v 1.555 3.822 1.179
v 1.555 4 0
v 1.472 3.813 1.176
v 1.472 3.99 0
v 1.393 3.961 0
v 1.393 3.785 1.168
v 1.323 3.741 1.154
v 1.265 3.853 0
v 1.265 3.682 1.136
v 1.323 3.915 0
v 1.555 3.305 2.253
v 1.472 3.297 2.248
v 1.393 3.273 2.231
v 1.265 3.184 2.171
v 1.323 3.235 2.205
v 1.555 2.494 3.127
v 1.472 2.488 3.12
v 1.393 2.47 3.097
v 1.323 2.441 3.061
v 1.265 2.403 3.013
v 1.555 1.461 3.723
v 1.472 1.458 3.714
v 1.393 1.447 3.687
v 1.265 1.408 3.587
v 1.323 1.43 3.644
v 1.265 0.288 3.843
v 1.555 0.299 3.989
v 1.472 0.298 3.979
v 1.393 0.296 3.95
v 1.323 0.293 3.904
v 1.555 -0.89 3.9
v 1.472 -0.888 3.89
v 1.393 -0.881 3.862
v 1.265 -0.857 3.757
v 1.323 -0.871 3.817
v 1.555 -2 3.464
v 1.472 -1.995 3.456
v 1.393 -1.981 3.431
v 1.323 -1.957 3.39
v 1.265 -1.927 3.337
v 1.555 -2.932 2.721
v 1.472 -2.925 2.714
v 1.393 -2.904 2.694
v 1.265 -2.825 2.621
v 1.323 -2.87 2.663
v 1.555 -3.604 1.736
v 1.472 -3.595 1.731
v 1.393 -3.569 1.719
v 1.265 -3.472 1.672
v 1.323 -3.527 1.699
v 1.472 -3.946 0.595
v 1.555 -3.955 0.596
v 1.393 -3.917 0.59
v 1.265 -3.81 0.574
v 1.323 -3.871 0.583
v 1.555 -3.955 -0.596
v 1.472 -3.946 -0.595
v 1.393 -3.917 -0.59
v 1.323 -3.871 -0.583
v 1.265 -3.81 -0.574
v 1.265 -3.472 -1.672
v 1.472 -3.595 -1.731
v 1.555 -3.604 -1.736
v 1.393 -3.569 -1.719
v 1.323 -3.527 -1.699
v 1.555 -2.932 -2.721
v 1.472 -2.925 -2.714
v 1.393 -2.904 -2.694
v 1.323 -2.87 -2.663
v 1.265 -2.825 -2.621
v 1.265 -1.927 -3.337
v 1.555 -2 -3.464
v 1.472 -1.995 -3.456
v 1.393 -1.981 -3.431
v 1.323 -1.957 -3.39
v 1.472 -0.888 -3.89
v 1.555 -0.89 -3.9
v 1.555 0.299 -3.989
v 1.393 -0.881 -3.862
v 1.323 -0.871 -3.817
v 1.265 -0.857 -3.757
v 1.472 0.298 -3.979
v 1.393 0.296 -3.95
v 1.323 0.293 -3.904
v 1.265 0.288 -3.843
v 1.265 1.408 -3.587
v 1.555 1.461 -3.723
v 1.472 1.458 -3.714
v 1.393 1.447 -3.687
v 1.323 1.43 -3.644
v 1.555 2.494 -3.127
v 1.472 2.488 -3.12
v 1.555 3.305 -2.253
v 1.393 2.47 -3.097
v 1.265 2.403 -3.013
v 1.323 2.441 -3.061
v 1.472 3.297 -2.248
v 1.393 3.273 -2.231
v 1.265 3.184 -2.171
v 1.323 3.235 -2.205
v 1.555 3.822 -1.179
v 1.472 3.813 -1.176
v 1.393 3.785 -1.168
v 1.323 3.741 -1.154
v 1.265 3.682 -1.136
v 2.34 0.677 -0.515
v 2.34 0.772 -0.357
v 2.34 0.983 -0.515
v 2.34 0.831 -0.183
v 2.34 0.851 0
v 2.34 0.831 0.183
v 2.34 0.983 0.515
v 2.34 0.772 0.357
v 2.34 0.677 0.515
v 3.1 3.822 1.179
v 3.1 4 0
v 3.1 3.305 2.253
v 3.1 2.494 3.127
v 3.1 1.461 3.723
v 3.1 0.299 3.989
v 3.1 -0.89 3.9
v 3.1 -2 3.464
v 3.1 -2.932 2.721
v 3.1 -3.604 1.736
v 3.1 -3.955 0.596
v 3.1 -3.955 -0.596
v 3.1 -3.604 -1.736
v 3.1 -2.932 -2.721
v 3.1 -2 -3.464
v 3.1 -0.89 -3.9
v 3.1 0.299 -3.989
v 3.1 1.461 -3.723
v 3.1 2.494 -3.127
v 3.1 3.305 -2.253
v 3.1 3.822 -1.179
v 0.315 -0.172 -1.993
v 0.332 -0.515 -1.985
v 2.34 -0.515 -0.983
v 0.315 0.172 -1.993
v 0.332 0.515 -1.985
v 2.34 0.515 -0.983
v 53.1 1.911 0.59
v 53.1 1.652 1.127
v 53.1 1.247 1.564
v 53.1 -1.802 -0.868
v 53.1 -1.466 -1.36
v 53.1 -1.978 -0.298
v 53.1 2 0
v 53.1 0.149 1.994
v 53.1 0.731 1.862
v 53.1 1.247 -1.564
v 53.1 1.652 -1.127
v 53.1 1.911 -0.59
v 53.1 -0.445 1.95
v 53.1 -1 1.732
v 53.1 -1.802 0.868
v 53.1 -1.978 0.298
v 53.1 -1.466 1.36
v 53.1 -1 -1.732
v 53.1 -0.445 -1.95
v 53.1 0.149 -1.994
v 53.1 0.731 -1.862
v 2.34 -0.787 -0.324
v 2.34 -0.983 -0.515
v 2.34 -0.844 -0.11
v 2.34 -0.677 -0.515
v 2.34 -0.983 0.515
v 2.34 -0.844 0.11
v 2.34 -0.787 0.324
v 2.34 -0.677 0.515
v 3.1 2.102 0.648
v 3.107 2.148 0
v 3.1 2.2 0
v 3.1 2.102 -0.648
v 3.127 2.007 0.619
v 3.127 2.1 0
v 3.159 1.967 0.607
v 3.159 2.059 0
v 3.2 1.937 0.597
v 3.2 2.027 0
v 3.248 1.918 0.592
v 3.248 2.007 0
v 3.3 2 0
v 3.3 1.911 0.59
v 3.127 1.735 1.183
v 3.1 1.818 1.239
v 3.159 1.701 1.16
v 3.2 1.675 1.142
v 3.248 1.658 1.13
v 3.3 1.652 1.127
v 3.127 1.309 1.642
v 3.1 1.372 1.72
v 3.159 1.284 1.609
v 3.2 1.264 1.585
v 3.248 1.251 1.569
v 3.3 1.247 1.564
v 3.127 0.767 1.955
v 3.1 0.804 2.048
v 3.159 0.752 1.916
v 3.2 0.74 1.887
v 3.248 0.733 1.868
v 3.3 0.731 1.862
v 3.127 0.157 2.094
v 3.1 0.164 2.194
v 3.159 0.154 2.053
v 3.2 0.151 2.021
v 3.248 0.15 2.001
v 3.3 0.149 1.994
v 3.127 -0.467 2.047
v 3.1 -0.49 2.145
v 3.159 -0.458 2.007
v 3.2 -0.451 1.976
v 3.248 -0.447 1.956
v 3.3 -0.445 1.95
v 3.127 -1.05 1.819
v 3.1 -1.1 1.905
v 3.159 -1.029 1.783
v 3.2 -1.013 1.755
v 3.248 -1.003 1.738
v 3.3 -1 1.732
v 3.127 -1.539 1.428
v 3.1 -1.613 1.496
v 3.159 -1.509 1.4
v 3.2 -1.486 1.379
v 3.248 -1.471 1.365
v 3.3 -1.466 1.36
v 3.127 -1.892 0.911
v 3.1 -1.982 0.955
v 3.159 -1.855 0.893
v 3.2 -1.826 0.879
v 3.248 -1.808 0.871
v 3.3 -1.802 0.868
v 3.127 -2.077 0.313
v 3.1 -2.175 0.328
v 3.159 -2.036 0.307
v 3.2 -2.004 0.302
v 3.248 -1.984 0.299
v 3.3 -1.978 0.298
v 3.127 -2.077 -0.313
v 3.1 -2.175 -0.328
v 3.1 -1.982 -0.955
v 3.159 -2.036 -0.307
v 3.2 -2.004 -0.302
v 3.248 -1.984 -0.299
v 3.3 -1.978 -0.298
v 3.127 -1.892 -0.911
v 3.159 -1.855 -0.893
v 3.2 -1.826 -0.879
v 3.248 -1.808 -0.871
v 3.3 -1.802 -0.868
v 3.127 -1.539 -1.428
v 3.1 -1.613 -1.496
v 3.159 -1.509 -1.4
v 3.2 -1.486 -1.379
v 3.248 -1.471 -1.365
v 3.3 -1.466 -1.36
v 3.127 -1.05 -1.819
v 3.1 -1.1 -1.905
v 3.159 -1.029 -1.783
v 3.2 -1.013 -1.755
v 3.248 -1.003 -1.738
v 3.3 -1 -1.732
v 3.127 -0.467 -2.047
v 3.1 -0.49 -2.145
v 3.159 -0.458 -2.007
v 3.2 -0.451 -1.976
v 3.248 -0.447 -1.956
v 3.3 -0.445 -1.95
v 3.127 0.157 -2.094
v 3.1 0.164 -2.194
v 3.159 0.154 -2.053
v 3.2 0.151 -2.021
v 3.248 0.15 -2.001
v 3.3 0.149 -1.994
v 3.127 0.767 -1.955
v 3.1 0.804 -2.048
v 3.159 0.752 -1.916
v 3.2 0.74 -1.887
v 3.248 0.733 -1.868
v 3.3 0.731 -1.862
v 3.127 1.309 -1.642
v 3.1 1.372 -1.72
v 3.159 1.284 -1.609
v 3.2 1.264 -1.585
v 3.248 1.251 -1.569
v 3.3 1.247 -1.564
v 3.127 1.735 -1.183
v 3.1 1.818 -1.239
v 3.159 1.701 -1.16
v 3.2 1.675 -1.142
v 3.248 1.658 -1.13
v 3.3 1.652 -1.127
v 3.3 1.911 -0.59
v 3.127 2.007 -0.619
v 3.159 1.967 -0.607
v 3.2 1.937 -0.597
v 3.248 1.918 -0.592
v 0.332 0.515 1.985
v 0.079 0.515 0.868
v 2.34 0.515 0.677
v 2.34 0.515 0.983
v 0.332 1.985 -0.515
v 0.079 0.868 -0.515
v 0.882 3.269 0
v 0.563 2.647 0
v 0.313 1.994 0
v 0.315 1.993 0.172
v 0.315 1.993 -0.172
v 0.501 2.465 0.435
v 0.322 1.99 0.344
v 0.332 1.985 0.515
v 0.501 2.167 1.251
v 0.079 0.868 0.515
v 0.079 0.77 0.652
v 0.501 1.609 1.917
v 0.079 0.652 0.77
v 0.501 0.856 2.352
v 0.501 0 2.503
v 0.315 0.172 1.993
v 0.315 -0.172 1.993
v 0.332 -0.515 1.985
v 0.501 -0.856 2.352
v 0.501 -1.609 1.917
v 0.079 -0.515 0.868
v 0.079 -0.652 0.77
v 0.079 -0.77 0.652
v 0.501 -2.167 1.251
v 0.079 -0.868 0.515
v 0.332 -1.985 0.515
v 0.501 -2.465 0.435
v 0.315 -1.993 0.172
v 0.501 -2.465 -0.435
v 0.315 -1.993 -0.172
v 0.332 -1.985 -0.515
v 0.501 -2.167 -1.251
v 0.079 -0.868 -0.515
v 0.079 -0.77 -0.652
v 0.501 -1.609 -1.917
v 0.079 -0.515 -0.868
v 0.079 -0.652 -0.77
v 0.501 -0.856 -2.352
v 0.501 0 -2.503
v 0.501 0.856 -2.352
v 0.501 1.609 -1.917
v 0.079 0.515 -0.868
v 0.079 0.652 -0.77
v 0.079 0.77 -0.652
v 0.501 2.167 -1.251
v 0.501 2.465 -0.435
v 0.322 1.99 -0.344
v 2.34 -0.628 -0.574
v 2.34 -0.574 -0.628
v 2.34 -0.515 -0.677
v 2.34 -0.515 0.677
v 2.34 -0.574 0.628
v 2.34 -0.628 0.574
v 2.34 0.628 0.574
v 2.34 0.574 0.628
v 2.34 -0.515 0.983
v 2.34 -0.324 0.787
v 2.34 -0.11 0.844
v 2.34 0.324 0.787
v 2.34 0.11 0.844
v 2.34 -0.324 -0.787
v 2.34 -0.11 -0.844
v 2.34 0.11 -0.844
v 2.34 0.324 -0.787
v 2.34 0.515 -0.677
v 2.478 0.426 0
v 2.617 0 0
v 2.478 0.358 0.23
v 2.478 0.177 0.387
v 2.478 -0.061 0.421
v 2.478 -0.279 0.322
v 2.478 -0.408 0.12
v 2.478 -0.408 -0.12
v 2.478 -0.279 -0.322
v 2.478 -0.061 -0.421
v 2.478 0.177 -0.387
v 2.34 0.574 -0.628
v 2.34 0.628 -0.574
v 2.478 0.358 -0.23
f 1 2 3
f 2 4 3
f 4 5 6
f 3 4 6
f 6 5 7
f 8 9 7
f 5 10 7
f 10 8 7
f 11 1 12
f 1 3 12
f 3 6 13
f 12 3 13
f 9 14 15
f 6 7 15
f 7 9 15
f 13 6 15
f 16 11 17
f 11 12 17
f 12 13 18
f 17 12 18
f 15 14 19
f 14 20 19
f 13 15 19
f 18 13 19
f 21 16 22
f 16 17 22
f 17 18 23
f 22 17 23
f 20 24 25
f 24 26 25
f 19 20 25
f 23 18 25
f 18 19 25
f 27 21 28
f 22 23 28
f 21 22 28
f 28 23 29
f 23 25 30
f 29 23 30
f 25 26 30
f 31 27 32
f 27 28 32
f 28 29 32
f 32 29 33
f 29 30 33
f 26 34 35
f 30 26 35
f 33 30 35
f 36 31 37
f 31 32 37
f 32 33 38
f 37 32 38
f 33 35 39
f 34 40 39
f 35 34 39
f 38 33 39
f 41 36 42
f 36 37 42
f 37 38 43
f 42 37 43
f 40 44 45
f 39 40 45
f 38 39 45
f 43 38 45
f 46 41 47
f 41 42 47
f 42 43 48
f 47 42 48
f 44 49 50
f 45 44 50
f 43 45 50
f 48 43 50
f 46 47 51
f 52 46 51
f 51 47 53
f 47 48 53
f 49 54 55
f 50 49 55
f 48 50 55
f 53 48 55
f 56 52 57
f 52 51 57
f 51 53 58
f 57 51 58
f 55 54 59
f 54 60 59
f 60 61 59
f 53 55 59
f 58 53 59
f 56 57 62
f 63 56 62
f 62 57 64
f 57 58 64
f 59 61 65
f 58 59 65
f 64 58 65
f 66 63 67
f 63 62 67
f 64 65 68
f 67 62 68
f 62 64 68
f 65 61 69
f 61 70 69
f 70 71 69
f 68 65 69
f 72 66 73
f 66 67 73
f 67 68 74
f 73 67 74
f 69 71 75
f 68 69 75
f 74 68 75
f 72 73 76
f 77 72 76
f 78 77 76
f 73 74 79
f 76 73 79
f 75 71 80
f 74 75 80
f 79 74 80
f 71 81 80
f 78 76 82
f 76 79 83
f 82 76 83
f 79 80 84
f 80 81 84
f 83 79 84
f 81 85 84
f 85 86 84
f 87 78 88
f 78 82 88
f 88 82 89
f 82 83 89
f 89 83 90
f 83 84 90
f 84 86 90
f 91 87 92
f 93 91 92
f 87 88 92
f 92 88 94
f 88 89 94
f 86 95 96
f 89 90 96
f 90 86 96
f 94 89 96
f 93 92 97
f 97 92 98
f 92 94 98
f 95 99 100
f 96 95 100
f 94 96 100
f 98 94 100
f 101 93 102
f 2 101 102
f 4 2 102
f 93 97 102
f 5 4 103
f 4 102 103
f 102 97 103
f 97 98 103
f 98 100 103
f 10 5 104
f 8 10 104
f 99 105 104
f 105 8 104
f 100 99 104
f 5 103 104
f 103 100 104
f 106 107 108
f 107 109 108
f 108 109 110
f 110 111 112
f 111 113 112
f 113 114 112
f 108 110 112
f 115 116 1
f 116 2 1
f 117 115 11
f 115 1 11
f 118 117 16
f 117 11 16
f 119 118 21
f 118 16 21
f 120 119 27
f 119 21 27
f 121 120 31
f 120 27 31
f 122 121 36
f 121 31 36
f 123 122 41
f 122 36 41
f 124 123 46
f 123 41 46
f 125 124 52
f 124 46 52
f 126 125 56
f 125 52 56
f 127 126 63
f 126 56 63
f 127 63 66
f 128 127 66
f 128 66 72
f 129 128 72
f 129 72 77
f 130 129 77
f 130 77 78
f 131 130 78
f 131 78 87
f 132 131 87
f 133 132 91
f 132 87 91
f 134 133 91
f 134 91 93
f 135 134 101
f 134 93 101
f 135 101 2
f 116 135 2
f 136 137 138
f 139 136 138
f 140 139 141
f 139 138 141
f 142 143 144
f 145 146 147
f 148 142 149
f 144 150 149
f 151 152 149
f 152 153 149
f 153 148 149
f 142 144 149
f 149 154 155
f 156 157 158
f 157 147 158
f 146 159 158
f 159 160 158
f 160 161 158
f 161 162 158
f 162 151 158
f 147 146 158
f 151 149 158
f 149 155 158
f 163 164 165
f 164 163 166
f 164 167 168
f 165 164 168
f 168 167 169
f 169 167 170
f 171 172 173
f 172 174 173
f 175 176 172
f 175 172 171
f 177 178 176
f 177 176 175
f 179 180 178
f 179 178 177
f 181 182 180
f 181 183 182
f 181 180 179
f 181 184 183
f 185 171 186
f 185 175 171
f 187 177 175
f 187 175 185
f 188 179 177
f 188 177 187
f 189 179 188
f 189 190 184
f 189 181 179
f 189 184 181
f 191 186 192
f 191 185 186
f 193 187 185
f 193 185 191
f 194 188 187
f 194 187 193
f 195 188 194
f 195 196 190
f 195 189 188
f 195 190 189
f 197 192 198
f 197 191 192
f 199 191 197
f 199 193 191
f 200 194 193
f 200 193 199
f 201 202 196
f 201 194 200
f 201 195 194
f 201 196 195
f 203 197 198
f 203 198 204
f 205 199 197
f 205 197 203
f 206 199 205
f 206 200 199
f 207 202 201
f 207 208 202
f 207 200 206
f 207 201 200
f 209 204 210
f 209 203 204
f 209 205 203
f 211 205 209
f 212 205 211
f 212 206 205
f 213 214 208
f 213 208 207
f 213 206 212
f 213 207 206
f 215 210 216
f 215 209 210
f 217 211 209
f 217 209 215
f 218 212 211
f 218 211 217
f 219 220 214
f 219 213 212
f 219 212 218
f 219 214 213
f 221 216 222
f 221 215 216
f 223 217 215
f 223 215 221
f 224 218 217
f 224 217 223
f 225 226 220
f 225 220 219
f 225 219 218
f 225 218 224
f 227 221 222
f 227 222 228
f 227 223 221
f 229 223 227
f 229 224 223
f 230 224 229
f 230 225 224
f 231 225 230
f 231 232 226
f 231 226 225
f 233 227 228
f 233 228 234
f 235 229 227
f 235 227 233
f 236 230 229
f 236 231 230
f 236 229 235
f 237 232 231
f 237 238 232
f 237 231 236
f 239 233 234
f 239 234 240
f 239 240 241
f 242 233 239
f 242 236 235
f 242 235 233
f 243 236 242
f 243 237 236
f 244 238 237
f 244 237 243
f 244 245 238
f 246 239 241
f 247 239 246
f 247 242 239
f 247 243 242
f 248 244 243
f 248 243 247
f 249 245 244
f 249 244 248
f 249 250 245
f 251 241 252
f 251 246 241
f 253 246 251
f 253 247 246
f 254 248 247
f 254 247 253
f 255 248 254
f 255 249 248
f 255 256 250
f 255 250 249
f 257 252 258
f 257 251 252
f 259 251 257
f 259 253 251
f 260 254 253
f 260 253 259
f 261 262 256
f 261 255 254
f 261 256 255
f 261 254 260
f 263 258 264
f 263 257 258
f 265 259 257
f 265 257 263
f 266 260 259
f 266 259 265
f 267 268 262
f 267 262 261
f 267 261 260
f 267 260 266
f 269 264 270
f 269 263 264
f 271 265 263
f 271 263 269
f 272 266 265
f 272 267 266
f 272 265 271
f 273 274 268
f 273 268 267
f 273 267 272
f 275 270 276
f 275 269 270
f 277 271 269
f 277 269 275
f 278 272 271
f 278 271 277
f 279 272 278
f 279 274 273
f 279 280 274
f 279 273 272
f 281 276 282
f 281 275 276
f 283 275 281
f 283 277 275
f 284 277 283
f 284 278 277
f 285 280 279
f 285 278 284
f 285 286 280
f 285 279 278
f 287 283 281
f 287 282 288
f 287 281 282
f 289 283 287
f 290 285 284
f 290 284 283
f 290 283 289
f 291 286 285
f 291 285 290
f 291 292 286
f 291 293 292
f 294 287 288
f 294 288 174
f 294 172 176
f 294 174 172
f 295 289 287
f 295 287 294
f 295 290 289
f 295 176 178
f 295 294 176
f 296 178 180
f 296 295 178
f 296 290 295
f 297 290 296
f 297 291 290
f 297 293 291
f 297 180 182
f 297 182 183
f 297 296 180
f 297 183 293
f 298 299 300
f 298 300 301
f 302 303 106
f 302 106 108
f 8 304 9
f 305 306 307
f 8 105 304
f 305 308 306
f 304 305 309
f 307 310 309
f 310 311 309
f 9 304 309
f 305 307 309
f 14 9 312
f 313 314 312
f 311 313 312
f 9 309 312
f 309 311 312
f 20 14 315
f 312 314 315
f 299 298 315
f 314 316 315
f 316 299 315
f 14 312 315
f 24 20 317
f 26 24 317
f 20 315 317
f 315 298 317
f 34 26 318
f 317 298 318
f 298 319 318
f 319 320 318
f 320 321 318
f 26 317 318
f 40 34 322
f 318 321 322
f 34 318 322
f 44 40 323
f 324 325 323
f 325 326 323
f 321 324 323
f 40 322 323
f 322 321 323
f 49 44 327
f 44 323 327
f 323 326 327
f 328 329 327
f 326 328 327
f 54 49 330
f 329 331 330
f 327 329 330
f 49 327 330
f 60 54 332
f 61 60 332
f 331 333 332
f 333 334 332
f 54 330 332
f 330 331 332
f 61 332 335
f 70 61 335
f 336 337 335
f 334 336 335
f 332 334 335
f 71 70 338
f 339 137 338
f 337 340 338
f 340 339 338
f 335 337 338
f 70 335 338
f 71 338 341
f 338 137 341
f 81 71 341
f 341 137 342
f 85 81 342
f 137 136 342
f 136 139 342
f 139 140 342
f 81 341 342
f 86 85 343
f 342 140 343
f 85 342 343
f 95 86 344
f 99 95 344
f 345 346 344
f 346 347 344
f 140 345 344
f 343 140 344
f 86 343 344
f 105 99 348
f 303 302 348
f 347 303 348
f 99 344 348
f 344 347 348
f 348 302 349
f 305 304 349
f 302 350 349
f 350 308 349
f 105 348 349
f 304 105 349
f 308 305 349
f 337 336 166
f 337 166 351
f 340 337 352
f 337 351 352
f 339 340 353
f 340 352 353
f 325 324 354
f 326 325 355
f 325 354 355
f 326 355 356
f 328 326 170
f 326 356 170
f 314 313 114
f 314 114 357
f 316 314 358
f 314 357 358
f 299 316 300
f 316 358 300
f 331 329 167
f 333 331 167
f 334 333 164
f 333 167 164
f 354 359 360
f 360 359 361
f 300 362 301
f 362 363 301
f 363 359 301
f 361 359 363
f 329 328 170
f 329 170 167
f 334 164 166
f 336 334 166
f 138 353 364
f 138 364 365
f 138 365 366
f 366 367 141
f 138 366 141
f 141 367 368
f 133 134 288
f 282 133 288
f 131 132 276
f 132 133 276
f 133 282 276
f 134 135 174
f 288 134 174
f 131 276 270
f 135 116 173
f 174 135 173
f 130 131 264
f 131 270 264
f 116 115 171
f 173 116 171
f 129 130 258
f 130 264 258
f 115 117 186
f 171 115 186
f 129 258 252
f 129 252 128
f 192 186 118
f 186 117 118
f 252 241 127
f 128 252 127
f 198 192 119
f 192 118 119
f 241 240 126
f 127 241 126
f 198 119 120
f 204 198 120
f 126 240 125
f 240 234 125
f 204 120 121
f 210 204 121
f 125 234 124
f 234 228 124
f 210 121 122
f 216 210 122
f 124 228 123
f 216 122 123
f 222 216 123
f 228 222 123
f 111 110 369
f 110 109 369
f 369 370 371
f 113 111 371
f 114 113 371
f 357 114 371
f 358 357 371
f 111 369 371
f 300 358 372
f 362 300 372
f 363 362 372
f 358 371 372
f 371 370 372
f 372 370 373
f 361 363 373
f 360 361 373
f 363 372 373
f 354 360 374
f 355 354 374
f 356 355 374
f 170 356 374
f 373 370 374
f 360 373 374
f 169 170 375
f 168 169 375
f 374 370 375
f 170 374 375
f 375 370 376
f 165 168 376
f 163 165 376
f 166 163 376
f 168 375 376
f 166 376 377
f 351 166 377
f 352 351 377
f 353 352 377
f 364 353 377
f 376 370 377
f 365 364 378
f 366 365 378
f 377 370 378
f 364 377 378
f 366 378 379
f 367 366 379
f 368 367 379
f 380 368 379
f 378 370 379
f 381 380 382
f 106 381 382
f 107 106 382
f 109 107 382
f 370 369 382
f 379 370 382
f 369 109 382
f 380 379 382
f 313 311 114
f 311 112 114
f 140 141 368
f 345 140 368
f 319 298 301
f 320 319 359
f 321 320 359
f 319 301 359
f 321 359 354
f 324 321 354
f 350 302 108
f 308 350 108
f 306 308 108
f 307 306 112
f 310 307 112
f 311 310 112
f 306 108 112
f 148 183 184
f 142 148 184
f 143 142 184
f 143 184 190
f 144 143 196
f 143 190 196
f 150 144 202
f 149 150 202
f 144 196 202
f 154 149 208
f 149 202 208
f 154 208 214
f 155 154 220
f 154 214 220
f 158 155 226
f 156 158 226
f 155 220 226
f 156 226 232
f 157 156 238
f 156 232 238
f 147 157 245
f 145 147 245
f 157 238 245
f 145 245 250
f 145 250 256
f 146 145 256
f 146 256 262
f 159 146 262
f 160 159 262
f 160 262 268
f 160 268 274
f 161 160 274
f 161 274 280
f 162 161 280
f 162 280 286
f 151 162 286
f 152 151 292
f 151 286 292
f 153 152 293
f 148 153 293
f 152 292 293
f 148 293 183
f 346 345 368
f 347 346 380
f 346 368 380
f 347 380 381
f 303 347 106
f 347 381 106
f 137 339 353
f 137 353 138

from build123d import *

# Parameters (mm, degrees)
FILLET1_R    = 0.2
SKETCH3_W    = 1.03
SKETCH3_H    = 4.3
SKETCH4_W    = 1.03
SKETCH4_H    = 1.966638154
RECPAT_COUNT = 2
RECPAT_ANGLE = 90


with BuildPart() as part:
    # BodySke → Base-Revolve (revolve)
    with BuildSketch(Plane.XY):
        with BuildLine():
            Line((3.1, 2), (3.1, 4))
            Line((3.1, 4), (1.555305874, 4))
            ThreePointArc((1.555305874, 4), (1.392873227, 3.961271902), (1.265388955, 3.853420195))
            ThreePointArc((1.265388955, 3.853420195), (0.324444487, 2.027933456), (0, 0))
            Line((0, 0), (53.1, 0))
            Line((53.1, 0), (53.1, 2))
            Line((53.1, 2), (3.1, 2))
        make_face()
    revolve(axis=Axis((-25.4, 0, 0), (1, 0, 0)))

    # Fillet1
    fillet1_edges = [part.edges().sort_by_distance(p)[0] for p in [
        (3.1, -2, 0),
    ]]
    fillet(fillet1_edges, radius=FILLET1_R)

    # Sketch3 → Recess section 0
    with BuildSketch(Plane(origin=(0, 0, 0), x_dir=(0, 0, -1), z_dir=(1, 0, 0))):
        Rectangle(SKETCH3_W, SKETCH3_H)
    # Sketch4 → Recess section 1
    with BuildSketch(Plane(origin=(2.34, 0, 0), x_dir=(0, 0, -1), z_dir=(1, 0, 0))):
        Rectangle(SKETCH4_W, SKETCH4_H)
    recess = loft(mode=Mode.SUBTRACT)

    # RecPat: Recess ×2 about axis
    recpat_axis = Axis((0, 0, 0), (1, 0, 0))
    for i in range(1, RECPAT_COUNT):
        add(recess.rotate(recpat_axis, i * RECPAT_ANGLE / (RECPAT_COUNT - 1)), mode=Mode.SUBTRACT)

    # RecCorSke → RecessCore (revolve, cut)
    with BuildSketch(Plane.XY):
        Polygon((0, 0), (0, 1.01462874), (2.34, 0.851), (2.616506661, 0), align=None)
    revolve(axis=Axis((-3.175, 0, 0), (1, 0, 0)), mode=Mode.SUBTRACT)


solid = part.part
